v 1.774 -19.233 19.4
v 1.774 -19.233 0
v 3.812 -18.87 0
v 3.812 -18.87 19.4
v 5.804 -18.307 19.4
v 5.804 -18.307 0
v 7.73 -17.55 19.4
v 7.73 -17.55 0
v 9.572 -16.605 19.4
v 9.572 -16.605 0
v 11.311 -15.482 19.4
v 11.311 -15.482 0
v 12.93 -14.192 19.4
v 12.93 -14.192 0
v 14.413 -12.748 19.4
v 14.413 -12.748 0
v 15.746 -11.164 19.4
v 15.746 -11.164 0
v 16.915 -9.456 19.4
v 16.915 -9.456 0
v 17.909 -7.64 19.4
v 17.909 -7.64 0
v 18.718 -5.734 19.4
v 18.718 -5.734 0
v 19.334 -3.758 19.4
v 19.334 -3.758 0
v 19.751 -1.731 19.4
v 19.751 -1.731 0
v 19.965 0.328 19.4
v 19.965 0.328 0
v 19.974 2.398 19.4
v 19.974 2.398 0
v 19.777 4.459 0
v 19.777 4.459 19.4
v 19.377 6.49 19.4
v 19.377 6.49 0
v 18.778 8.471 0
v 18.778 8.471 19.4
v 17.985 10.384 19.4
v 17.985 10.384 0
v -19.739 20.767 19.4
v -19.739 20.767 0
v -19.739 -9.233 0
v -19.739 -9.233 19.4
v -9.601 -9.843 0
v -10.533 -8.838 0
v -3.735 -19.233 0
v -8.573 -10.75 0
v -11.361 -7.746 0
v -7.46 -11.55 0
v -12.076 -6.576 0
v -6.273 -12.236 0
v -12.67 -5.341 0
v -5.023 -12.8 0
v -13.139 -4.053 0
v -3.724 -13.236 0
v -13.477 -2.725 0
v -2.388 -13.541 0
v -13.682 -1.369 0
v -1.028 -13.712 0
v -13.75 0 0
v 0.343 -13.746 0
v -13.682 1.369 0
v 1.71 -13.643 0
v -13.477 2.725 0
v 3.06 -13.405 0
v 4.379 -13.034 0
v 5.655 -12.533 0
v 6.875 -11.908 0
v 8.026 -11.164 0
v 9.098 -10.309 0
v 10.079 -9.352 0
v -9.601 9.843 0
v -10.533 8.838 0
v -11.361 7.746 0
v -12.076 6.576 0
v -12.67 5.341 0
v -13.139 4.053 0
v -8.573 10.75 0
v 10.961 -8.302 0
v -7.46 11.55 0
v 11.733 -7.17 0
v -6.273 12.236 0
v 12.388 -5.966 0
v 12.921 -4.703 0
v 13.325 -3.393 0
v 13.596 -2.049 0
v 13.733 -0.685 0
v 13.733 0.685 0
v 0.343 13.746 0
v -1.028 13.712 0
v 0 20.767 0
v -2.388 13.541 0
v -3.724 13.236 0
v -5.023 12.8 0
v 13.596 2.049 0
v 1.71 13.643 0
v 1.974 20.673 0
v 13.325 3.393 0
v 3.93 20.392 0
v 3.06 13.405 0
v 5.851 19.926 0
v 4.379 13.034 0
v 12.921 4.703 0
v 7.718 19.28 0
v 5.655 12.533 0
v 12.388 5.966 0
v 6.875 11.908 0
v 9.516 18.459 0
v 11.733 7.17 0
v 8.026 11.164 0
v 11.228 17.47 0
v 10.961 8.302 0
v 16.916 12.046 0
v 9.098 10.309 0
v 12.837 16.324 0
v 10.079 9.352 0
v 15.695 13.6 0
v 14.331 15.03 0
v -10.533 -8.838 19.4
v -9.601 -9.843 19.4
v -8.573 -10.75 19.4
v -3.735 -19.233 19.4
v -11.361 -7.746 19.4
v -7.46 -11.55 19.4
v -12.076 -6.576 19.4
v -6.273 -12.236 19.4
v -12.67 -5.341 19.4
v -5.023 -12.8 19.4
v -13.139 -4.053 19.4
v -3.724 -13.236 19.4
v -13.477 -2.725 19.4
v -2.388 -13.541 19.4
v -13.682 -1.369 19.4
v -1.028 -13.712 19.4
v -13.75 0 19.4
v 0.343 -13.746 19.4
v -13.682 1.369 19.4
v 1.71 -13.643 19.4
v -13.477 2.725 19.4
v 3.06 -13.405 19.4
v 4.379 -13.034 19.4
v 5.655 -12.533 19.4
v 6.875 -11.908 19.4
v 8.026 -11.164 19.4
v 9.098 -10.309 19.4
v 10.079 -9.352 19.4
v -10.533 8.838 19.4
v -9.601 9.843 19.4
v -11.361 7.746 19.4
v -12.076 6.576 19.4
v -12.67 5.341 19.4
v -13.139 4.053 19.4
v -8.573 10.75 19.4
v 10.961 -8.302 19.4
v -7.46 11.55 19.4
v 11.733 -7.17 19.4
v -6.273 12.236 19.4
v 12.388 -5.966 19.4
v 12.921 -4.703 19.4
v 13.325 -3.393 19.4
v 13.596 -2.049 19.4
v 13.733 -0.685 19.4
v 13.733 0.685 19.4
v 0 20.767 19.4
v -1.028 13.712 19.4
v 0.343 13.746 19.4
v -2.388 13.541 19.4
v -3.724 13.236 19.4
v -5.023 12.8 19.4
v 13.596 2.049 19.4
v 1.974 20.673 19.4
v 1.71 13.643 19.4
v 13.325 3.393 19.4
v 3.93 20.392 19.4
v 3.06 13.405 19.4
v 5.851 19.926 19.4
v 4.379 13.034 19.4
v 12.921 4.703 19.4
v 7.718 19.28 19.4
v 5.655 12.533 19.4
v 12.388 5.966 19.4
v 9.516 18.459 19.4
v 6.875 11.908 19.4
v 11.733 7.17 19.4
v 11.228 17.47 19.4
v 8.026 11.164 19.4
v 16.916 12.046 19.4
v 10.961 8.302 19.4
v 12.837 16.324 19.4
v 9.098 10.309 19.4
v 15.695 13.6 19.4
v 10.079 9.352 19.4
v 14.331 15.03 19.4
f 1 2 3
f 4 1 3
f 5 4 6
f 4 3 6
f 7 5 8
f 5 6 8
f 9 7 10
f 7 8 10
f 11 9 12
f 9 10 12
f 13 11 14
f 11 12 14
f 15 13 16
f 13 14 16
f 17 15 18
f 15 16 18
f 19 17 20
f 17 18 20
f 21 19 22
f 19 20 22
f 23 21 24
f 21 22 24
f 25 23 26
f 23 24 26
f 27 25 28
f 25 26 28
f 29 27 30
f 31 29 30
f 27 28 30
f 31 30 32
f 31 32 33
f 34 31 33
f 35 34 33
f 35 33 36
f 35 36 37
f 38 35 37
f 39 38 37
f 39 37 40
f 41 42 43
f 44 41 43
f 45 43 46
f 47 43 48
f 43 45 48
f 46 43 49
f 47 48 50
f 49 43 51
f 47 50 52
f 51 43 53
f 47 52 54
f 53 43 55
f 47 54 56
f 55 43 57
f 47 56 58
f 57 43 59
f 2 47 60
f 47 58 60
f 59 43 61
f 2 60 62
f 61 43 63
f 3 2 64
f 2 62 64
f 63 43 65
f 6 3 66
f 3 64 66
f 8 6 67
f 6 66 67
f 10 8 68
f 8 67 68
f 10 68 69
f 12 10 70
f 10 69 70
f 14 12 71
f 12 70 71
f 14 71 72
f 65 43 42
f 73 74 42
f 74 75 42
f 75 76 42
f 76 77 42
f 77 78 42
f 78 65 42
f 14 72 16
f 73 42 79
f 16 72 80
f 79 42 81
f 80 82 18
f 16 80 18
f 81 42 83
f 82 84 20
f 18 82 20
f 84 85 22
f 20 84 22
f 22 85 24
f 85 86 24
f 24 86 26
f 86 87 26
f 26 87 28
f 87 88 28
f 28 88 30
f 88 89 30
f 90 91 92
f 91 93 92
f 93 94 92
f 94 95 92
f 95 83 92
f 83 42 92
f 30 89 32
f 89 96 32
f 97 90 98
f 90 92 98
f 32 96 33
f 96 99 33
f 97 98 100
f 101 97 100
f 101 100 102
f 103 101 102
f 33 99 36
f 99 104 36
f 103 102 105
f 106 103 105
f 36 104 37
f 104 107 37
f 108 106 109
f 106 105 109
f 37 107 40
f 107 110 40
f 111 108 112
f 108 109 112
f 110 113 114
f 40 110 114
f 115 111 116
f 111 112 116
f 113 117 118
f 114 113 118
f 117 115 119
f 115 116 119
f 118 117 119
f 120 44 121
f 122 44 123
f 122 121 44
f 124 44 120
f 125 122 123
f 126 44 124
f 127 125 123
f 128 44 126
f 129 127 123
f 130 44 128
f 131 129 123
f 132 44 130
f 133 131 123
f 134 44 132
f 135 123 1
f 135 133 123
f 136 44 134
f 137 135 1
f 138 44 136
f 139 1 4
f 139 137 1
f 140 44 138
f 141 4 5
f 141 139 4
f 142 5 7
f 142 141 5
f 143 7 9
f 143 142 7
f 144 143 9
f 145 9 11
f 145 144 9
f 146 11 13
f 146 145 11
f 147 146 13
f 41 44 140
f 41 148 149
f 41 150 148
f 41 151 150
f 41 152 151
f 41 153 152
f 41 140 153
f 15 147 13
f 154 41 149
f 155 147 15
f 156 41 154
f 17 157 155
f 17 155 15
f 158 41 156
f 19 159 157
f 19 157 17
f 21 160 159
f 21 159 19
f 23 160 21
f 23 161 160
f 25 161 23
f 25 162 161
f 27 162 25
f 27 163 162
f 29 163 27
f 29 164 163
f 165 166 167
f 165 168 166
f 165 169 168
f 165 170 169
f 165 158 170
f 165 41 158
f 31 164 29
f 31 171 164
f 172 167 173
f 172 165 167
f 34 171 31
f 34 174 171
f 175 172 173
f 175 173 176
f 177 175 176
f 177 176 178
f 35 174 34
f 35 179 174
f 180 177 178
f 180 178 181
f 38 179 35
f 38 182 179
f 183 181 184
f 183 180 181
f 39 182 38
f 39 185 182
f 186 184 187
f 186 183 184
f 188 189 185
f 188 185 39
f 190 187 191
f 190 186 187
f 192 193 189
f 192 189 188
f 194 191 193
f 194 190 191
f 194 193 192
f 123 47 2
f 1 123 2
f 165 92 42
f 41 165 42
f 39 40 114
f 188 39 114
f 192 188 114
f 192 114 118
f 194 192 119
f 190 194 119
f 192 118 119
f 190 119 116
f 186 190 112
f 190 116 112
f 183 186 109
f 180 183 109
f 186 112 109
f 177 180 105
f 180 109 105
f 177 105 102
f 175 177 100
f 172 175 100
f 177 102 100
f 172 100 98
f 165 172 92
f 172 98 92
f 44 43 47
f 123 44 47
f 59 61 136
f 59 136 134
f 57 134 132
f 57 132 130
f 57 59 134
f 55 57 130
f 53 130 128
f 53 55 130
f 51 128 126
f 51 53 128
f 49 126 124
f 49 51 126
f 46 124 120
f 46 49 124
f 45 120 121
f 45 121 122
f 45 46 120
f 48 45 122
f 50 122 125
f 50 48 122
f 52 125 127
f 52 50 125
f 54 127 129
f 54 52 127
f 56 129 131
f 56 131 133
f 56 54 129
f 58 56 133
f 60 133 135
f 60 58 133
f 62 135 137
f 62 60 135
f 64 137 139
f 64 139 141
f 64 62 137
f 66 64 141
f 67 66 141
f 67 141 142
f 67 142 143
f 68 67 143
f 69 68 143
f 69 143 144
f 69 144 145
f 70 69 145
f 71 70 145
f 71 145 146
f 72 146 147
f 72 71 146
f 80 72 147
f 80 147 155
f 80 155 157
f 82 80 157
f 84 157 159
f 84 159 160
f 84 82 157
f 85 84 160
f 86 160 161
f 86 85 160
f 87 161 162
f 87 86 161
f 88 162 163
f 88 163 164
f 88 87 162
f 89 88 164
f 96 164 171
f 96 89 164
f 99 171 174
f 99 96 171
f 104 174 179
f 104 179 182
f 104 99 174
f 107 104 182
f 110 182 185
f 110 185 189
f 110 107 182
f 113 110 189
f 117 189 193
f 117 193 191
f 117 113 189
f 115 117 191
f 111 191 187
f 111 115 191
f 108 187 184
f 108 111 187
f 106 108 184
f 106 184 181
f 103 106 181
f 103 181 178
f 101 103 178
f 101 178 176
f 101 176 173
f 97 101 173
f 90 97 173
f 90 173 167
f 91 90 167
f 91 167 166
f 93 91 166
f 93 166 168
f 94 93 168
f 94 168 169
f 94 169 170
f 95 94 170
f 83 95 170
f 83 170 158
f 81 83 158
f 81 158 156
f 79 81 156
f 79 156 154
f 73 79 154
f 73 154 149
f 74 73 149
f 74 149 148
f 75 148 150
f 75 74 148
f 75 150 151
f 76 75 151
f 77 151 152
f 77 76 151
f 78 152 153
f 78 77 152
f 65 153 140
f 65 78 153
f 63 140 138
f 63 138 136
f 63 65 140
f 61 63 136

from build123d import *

# Parameters (mm, degrees)
SKETCH2_R           = 13.75
BOSS_EXTRUDE1_DEPTH = 19.4


with BuildPart() as part:
    # Sketch2 → Boss-Extrude1 (new body)
    with BuildSketch(Plane.XY):
        with BuildLine():
            Line((-19.738634508, 20.767211648), (-19.738634508, -9.232788352))
            Line((-19.738634508, -9.232788352), (-3.735289218, -19.232788352))
            Line((-3.735289218, -19.232788352), (1.773741407, -19.232788352))
            ThreePointArc((1.773741407, -19.232788352), (17.434536233, -8.560097374), (17.984932853, 10.383605824))
            ThreePointArc((17.984932853, 10.383605824), (10.383605824, 17.984932853), (0, 20.767211648))
            Line((0, 20.767211648), (-19.738634508, 20.767211648))
        make_face()
        with Locations(Location((0, 0, 0), (0, 0, 180))):
            Circle(SKETCH2_R, mode=Mode.SUBTRACT)
    extrude(amount=BOSS_EXTRUDE1_DEPTH)


solid = part.part
